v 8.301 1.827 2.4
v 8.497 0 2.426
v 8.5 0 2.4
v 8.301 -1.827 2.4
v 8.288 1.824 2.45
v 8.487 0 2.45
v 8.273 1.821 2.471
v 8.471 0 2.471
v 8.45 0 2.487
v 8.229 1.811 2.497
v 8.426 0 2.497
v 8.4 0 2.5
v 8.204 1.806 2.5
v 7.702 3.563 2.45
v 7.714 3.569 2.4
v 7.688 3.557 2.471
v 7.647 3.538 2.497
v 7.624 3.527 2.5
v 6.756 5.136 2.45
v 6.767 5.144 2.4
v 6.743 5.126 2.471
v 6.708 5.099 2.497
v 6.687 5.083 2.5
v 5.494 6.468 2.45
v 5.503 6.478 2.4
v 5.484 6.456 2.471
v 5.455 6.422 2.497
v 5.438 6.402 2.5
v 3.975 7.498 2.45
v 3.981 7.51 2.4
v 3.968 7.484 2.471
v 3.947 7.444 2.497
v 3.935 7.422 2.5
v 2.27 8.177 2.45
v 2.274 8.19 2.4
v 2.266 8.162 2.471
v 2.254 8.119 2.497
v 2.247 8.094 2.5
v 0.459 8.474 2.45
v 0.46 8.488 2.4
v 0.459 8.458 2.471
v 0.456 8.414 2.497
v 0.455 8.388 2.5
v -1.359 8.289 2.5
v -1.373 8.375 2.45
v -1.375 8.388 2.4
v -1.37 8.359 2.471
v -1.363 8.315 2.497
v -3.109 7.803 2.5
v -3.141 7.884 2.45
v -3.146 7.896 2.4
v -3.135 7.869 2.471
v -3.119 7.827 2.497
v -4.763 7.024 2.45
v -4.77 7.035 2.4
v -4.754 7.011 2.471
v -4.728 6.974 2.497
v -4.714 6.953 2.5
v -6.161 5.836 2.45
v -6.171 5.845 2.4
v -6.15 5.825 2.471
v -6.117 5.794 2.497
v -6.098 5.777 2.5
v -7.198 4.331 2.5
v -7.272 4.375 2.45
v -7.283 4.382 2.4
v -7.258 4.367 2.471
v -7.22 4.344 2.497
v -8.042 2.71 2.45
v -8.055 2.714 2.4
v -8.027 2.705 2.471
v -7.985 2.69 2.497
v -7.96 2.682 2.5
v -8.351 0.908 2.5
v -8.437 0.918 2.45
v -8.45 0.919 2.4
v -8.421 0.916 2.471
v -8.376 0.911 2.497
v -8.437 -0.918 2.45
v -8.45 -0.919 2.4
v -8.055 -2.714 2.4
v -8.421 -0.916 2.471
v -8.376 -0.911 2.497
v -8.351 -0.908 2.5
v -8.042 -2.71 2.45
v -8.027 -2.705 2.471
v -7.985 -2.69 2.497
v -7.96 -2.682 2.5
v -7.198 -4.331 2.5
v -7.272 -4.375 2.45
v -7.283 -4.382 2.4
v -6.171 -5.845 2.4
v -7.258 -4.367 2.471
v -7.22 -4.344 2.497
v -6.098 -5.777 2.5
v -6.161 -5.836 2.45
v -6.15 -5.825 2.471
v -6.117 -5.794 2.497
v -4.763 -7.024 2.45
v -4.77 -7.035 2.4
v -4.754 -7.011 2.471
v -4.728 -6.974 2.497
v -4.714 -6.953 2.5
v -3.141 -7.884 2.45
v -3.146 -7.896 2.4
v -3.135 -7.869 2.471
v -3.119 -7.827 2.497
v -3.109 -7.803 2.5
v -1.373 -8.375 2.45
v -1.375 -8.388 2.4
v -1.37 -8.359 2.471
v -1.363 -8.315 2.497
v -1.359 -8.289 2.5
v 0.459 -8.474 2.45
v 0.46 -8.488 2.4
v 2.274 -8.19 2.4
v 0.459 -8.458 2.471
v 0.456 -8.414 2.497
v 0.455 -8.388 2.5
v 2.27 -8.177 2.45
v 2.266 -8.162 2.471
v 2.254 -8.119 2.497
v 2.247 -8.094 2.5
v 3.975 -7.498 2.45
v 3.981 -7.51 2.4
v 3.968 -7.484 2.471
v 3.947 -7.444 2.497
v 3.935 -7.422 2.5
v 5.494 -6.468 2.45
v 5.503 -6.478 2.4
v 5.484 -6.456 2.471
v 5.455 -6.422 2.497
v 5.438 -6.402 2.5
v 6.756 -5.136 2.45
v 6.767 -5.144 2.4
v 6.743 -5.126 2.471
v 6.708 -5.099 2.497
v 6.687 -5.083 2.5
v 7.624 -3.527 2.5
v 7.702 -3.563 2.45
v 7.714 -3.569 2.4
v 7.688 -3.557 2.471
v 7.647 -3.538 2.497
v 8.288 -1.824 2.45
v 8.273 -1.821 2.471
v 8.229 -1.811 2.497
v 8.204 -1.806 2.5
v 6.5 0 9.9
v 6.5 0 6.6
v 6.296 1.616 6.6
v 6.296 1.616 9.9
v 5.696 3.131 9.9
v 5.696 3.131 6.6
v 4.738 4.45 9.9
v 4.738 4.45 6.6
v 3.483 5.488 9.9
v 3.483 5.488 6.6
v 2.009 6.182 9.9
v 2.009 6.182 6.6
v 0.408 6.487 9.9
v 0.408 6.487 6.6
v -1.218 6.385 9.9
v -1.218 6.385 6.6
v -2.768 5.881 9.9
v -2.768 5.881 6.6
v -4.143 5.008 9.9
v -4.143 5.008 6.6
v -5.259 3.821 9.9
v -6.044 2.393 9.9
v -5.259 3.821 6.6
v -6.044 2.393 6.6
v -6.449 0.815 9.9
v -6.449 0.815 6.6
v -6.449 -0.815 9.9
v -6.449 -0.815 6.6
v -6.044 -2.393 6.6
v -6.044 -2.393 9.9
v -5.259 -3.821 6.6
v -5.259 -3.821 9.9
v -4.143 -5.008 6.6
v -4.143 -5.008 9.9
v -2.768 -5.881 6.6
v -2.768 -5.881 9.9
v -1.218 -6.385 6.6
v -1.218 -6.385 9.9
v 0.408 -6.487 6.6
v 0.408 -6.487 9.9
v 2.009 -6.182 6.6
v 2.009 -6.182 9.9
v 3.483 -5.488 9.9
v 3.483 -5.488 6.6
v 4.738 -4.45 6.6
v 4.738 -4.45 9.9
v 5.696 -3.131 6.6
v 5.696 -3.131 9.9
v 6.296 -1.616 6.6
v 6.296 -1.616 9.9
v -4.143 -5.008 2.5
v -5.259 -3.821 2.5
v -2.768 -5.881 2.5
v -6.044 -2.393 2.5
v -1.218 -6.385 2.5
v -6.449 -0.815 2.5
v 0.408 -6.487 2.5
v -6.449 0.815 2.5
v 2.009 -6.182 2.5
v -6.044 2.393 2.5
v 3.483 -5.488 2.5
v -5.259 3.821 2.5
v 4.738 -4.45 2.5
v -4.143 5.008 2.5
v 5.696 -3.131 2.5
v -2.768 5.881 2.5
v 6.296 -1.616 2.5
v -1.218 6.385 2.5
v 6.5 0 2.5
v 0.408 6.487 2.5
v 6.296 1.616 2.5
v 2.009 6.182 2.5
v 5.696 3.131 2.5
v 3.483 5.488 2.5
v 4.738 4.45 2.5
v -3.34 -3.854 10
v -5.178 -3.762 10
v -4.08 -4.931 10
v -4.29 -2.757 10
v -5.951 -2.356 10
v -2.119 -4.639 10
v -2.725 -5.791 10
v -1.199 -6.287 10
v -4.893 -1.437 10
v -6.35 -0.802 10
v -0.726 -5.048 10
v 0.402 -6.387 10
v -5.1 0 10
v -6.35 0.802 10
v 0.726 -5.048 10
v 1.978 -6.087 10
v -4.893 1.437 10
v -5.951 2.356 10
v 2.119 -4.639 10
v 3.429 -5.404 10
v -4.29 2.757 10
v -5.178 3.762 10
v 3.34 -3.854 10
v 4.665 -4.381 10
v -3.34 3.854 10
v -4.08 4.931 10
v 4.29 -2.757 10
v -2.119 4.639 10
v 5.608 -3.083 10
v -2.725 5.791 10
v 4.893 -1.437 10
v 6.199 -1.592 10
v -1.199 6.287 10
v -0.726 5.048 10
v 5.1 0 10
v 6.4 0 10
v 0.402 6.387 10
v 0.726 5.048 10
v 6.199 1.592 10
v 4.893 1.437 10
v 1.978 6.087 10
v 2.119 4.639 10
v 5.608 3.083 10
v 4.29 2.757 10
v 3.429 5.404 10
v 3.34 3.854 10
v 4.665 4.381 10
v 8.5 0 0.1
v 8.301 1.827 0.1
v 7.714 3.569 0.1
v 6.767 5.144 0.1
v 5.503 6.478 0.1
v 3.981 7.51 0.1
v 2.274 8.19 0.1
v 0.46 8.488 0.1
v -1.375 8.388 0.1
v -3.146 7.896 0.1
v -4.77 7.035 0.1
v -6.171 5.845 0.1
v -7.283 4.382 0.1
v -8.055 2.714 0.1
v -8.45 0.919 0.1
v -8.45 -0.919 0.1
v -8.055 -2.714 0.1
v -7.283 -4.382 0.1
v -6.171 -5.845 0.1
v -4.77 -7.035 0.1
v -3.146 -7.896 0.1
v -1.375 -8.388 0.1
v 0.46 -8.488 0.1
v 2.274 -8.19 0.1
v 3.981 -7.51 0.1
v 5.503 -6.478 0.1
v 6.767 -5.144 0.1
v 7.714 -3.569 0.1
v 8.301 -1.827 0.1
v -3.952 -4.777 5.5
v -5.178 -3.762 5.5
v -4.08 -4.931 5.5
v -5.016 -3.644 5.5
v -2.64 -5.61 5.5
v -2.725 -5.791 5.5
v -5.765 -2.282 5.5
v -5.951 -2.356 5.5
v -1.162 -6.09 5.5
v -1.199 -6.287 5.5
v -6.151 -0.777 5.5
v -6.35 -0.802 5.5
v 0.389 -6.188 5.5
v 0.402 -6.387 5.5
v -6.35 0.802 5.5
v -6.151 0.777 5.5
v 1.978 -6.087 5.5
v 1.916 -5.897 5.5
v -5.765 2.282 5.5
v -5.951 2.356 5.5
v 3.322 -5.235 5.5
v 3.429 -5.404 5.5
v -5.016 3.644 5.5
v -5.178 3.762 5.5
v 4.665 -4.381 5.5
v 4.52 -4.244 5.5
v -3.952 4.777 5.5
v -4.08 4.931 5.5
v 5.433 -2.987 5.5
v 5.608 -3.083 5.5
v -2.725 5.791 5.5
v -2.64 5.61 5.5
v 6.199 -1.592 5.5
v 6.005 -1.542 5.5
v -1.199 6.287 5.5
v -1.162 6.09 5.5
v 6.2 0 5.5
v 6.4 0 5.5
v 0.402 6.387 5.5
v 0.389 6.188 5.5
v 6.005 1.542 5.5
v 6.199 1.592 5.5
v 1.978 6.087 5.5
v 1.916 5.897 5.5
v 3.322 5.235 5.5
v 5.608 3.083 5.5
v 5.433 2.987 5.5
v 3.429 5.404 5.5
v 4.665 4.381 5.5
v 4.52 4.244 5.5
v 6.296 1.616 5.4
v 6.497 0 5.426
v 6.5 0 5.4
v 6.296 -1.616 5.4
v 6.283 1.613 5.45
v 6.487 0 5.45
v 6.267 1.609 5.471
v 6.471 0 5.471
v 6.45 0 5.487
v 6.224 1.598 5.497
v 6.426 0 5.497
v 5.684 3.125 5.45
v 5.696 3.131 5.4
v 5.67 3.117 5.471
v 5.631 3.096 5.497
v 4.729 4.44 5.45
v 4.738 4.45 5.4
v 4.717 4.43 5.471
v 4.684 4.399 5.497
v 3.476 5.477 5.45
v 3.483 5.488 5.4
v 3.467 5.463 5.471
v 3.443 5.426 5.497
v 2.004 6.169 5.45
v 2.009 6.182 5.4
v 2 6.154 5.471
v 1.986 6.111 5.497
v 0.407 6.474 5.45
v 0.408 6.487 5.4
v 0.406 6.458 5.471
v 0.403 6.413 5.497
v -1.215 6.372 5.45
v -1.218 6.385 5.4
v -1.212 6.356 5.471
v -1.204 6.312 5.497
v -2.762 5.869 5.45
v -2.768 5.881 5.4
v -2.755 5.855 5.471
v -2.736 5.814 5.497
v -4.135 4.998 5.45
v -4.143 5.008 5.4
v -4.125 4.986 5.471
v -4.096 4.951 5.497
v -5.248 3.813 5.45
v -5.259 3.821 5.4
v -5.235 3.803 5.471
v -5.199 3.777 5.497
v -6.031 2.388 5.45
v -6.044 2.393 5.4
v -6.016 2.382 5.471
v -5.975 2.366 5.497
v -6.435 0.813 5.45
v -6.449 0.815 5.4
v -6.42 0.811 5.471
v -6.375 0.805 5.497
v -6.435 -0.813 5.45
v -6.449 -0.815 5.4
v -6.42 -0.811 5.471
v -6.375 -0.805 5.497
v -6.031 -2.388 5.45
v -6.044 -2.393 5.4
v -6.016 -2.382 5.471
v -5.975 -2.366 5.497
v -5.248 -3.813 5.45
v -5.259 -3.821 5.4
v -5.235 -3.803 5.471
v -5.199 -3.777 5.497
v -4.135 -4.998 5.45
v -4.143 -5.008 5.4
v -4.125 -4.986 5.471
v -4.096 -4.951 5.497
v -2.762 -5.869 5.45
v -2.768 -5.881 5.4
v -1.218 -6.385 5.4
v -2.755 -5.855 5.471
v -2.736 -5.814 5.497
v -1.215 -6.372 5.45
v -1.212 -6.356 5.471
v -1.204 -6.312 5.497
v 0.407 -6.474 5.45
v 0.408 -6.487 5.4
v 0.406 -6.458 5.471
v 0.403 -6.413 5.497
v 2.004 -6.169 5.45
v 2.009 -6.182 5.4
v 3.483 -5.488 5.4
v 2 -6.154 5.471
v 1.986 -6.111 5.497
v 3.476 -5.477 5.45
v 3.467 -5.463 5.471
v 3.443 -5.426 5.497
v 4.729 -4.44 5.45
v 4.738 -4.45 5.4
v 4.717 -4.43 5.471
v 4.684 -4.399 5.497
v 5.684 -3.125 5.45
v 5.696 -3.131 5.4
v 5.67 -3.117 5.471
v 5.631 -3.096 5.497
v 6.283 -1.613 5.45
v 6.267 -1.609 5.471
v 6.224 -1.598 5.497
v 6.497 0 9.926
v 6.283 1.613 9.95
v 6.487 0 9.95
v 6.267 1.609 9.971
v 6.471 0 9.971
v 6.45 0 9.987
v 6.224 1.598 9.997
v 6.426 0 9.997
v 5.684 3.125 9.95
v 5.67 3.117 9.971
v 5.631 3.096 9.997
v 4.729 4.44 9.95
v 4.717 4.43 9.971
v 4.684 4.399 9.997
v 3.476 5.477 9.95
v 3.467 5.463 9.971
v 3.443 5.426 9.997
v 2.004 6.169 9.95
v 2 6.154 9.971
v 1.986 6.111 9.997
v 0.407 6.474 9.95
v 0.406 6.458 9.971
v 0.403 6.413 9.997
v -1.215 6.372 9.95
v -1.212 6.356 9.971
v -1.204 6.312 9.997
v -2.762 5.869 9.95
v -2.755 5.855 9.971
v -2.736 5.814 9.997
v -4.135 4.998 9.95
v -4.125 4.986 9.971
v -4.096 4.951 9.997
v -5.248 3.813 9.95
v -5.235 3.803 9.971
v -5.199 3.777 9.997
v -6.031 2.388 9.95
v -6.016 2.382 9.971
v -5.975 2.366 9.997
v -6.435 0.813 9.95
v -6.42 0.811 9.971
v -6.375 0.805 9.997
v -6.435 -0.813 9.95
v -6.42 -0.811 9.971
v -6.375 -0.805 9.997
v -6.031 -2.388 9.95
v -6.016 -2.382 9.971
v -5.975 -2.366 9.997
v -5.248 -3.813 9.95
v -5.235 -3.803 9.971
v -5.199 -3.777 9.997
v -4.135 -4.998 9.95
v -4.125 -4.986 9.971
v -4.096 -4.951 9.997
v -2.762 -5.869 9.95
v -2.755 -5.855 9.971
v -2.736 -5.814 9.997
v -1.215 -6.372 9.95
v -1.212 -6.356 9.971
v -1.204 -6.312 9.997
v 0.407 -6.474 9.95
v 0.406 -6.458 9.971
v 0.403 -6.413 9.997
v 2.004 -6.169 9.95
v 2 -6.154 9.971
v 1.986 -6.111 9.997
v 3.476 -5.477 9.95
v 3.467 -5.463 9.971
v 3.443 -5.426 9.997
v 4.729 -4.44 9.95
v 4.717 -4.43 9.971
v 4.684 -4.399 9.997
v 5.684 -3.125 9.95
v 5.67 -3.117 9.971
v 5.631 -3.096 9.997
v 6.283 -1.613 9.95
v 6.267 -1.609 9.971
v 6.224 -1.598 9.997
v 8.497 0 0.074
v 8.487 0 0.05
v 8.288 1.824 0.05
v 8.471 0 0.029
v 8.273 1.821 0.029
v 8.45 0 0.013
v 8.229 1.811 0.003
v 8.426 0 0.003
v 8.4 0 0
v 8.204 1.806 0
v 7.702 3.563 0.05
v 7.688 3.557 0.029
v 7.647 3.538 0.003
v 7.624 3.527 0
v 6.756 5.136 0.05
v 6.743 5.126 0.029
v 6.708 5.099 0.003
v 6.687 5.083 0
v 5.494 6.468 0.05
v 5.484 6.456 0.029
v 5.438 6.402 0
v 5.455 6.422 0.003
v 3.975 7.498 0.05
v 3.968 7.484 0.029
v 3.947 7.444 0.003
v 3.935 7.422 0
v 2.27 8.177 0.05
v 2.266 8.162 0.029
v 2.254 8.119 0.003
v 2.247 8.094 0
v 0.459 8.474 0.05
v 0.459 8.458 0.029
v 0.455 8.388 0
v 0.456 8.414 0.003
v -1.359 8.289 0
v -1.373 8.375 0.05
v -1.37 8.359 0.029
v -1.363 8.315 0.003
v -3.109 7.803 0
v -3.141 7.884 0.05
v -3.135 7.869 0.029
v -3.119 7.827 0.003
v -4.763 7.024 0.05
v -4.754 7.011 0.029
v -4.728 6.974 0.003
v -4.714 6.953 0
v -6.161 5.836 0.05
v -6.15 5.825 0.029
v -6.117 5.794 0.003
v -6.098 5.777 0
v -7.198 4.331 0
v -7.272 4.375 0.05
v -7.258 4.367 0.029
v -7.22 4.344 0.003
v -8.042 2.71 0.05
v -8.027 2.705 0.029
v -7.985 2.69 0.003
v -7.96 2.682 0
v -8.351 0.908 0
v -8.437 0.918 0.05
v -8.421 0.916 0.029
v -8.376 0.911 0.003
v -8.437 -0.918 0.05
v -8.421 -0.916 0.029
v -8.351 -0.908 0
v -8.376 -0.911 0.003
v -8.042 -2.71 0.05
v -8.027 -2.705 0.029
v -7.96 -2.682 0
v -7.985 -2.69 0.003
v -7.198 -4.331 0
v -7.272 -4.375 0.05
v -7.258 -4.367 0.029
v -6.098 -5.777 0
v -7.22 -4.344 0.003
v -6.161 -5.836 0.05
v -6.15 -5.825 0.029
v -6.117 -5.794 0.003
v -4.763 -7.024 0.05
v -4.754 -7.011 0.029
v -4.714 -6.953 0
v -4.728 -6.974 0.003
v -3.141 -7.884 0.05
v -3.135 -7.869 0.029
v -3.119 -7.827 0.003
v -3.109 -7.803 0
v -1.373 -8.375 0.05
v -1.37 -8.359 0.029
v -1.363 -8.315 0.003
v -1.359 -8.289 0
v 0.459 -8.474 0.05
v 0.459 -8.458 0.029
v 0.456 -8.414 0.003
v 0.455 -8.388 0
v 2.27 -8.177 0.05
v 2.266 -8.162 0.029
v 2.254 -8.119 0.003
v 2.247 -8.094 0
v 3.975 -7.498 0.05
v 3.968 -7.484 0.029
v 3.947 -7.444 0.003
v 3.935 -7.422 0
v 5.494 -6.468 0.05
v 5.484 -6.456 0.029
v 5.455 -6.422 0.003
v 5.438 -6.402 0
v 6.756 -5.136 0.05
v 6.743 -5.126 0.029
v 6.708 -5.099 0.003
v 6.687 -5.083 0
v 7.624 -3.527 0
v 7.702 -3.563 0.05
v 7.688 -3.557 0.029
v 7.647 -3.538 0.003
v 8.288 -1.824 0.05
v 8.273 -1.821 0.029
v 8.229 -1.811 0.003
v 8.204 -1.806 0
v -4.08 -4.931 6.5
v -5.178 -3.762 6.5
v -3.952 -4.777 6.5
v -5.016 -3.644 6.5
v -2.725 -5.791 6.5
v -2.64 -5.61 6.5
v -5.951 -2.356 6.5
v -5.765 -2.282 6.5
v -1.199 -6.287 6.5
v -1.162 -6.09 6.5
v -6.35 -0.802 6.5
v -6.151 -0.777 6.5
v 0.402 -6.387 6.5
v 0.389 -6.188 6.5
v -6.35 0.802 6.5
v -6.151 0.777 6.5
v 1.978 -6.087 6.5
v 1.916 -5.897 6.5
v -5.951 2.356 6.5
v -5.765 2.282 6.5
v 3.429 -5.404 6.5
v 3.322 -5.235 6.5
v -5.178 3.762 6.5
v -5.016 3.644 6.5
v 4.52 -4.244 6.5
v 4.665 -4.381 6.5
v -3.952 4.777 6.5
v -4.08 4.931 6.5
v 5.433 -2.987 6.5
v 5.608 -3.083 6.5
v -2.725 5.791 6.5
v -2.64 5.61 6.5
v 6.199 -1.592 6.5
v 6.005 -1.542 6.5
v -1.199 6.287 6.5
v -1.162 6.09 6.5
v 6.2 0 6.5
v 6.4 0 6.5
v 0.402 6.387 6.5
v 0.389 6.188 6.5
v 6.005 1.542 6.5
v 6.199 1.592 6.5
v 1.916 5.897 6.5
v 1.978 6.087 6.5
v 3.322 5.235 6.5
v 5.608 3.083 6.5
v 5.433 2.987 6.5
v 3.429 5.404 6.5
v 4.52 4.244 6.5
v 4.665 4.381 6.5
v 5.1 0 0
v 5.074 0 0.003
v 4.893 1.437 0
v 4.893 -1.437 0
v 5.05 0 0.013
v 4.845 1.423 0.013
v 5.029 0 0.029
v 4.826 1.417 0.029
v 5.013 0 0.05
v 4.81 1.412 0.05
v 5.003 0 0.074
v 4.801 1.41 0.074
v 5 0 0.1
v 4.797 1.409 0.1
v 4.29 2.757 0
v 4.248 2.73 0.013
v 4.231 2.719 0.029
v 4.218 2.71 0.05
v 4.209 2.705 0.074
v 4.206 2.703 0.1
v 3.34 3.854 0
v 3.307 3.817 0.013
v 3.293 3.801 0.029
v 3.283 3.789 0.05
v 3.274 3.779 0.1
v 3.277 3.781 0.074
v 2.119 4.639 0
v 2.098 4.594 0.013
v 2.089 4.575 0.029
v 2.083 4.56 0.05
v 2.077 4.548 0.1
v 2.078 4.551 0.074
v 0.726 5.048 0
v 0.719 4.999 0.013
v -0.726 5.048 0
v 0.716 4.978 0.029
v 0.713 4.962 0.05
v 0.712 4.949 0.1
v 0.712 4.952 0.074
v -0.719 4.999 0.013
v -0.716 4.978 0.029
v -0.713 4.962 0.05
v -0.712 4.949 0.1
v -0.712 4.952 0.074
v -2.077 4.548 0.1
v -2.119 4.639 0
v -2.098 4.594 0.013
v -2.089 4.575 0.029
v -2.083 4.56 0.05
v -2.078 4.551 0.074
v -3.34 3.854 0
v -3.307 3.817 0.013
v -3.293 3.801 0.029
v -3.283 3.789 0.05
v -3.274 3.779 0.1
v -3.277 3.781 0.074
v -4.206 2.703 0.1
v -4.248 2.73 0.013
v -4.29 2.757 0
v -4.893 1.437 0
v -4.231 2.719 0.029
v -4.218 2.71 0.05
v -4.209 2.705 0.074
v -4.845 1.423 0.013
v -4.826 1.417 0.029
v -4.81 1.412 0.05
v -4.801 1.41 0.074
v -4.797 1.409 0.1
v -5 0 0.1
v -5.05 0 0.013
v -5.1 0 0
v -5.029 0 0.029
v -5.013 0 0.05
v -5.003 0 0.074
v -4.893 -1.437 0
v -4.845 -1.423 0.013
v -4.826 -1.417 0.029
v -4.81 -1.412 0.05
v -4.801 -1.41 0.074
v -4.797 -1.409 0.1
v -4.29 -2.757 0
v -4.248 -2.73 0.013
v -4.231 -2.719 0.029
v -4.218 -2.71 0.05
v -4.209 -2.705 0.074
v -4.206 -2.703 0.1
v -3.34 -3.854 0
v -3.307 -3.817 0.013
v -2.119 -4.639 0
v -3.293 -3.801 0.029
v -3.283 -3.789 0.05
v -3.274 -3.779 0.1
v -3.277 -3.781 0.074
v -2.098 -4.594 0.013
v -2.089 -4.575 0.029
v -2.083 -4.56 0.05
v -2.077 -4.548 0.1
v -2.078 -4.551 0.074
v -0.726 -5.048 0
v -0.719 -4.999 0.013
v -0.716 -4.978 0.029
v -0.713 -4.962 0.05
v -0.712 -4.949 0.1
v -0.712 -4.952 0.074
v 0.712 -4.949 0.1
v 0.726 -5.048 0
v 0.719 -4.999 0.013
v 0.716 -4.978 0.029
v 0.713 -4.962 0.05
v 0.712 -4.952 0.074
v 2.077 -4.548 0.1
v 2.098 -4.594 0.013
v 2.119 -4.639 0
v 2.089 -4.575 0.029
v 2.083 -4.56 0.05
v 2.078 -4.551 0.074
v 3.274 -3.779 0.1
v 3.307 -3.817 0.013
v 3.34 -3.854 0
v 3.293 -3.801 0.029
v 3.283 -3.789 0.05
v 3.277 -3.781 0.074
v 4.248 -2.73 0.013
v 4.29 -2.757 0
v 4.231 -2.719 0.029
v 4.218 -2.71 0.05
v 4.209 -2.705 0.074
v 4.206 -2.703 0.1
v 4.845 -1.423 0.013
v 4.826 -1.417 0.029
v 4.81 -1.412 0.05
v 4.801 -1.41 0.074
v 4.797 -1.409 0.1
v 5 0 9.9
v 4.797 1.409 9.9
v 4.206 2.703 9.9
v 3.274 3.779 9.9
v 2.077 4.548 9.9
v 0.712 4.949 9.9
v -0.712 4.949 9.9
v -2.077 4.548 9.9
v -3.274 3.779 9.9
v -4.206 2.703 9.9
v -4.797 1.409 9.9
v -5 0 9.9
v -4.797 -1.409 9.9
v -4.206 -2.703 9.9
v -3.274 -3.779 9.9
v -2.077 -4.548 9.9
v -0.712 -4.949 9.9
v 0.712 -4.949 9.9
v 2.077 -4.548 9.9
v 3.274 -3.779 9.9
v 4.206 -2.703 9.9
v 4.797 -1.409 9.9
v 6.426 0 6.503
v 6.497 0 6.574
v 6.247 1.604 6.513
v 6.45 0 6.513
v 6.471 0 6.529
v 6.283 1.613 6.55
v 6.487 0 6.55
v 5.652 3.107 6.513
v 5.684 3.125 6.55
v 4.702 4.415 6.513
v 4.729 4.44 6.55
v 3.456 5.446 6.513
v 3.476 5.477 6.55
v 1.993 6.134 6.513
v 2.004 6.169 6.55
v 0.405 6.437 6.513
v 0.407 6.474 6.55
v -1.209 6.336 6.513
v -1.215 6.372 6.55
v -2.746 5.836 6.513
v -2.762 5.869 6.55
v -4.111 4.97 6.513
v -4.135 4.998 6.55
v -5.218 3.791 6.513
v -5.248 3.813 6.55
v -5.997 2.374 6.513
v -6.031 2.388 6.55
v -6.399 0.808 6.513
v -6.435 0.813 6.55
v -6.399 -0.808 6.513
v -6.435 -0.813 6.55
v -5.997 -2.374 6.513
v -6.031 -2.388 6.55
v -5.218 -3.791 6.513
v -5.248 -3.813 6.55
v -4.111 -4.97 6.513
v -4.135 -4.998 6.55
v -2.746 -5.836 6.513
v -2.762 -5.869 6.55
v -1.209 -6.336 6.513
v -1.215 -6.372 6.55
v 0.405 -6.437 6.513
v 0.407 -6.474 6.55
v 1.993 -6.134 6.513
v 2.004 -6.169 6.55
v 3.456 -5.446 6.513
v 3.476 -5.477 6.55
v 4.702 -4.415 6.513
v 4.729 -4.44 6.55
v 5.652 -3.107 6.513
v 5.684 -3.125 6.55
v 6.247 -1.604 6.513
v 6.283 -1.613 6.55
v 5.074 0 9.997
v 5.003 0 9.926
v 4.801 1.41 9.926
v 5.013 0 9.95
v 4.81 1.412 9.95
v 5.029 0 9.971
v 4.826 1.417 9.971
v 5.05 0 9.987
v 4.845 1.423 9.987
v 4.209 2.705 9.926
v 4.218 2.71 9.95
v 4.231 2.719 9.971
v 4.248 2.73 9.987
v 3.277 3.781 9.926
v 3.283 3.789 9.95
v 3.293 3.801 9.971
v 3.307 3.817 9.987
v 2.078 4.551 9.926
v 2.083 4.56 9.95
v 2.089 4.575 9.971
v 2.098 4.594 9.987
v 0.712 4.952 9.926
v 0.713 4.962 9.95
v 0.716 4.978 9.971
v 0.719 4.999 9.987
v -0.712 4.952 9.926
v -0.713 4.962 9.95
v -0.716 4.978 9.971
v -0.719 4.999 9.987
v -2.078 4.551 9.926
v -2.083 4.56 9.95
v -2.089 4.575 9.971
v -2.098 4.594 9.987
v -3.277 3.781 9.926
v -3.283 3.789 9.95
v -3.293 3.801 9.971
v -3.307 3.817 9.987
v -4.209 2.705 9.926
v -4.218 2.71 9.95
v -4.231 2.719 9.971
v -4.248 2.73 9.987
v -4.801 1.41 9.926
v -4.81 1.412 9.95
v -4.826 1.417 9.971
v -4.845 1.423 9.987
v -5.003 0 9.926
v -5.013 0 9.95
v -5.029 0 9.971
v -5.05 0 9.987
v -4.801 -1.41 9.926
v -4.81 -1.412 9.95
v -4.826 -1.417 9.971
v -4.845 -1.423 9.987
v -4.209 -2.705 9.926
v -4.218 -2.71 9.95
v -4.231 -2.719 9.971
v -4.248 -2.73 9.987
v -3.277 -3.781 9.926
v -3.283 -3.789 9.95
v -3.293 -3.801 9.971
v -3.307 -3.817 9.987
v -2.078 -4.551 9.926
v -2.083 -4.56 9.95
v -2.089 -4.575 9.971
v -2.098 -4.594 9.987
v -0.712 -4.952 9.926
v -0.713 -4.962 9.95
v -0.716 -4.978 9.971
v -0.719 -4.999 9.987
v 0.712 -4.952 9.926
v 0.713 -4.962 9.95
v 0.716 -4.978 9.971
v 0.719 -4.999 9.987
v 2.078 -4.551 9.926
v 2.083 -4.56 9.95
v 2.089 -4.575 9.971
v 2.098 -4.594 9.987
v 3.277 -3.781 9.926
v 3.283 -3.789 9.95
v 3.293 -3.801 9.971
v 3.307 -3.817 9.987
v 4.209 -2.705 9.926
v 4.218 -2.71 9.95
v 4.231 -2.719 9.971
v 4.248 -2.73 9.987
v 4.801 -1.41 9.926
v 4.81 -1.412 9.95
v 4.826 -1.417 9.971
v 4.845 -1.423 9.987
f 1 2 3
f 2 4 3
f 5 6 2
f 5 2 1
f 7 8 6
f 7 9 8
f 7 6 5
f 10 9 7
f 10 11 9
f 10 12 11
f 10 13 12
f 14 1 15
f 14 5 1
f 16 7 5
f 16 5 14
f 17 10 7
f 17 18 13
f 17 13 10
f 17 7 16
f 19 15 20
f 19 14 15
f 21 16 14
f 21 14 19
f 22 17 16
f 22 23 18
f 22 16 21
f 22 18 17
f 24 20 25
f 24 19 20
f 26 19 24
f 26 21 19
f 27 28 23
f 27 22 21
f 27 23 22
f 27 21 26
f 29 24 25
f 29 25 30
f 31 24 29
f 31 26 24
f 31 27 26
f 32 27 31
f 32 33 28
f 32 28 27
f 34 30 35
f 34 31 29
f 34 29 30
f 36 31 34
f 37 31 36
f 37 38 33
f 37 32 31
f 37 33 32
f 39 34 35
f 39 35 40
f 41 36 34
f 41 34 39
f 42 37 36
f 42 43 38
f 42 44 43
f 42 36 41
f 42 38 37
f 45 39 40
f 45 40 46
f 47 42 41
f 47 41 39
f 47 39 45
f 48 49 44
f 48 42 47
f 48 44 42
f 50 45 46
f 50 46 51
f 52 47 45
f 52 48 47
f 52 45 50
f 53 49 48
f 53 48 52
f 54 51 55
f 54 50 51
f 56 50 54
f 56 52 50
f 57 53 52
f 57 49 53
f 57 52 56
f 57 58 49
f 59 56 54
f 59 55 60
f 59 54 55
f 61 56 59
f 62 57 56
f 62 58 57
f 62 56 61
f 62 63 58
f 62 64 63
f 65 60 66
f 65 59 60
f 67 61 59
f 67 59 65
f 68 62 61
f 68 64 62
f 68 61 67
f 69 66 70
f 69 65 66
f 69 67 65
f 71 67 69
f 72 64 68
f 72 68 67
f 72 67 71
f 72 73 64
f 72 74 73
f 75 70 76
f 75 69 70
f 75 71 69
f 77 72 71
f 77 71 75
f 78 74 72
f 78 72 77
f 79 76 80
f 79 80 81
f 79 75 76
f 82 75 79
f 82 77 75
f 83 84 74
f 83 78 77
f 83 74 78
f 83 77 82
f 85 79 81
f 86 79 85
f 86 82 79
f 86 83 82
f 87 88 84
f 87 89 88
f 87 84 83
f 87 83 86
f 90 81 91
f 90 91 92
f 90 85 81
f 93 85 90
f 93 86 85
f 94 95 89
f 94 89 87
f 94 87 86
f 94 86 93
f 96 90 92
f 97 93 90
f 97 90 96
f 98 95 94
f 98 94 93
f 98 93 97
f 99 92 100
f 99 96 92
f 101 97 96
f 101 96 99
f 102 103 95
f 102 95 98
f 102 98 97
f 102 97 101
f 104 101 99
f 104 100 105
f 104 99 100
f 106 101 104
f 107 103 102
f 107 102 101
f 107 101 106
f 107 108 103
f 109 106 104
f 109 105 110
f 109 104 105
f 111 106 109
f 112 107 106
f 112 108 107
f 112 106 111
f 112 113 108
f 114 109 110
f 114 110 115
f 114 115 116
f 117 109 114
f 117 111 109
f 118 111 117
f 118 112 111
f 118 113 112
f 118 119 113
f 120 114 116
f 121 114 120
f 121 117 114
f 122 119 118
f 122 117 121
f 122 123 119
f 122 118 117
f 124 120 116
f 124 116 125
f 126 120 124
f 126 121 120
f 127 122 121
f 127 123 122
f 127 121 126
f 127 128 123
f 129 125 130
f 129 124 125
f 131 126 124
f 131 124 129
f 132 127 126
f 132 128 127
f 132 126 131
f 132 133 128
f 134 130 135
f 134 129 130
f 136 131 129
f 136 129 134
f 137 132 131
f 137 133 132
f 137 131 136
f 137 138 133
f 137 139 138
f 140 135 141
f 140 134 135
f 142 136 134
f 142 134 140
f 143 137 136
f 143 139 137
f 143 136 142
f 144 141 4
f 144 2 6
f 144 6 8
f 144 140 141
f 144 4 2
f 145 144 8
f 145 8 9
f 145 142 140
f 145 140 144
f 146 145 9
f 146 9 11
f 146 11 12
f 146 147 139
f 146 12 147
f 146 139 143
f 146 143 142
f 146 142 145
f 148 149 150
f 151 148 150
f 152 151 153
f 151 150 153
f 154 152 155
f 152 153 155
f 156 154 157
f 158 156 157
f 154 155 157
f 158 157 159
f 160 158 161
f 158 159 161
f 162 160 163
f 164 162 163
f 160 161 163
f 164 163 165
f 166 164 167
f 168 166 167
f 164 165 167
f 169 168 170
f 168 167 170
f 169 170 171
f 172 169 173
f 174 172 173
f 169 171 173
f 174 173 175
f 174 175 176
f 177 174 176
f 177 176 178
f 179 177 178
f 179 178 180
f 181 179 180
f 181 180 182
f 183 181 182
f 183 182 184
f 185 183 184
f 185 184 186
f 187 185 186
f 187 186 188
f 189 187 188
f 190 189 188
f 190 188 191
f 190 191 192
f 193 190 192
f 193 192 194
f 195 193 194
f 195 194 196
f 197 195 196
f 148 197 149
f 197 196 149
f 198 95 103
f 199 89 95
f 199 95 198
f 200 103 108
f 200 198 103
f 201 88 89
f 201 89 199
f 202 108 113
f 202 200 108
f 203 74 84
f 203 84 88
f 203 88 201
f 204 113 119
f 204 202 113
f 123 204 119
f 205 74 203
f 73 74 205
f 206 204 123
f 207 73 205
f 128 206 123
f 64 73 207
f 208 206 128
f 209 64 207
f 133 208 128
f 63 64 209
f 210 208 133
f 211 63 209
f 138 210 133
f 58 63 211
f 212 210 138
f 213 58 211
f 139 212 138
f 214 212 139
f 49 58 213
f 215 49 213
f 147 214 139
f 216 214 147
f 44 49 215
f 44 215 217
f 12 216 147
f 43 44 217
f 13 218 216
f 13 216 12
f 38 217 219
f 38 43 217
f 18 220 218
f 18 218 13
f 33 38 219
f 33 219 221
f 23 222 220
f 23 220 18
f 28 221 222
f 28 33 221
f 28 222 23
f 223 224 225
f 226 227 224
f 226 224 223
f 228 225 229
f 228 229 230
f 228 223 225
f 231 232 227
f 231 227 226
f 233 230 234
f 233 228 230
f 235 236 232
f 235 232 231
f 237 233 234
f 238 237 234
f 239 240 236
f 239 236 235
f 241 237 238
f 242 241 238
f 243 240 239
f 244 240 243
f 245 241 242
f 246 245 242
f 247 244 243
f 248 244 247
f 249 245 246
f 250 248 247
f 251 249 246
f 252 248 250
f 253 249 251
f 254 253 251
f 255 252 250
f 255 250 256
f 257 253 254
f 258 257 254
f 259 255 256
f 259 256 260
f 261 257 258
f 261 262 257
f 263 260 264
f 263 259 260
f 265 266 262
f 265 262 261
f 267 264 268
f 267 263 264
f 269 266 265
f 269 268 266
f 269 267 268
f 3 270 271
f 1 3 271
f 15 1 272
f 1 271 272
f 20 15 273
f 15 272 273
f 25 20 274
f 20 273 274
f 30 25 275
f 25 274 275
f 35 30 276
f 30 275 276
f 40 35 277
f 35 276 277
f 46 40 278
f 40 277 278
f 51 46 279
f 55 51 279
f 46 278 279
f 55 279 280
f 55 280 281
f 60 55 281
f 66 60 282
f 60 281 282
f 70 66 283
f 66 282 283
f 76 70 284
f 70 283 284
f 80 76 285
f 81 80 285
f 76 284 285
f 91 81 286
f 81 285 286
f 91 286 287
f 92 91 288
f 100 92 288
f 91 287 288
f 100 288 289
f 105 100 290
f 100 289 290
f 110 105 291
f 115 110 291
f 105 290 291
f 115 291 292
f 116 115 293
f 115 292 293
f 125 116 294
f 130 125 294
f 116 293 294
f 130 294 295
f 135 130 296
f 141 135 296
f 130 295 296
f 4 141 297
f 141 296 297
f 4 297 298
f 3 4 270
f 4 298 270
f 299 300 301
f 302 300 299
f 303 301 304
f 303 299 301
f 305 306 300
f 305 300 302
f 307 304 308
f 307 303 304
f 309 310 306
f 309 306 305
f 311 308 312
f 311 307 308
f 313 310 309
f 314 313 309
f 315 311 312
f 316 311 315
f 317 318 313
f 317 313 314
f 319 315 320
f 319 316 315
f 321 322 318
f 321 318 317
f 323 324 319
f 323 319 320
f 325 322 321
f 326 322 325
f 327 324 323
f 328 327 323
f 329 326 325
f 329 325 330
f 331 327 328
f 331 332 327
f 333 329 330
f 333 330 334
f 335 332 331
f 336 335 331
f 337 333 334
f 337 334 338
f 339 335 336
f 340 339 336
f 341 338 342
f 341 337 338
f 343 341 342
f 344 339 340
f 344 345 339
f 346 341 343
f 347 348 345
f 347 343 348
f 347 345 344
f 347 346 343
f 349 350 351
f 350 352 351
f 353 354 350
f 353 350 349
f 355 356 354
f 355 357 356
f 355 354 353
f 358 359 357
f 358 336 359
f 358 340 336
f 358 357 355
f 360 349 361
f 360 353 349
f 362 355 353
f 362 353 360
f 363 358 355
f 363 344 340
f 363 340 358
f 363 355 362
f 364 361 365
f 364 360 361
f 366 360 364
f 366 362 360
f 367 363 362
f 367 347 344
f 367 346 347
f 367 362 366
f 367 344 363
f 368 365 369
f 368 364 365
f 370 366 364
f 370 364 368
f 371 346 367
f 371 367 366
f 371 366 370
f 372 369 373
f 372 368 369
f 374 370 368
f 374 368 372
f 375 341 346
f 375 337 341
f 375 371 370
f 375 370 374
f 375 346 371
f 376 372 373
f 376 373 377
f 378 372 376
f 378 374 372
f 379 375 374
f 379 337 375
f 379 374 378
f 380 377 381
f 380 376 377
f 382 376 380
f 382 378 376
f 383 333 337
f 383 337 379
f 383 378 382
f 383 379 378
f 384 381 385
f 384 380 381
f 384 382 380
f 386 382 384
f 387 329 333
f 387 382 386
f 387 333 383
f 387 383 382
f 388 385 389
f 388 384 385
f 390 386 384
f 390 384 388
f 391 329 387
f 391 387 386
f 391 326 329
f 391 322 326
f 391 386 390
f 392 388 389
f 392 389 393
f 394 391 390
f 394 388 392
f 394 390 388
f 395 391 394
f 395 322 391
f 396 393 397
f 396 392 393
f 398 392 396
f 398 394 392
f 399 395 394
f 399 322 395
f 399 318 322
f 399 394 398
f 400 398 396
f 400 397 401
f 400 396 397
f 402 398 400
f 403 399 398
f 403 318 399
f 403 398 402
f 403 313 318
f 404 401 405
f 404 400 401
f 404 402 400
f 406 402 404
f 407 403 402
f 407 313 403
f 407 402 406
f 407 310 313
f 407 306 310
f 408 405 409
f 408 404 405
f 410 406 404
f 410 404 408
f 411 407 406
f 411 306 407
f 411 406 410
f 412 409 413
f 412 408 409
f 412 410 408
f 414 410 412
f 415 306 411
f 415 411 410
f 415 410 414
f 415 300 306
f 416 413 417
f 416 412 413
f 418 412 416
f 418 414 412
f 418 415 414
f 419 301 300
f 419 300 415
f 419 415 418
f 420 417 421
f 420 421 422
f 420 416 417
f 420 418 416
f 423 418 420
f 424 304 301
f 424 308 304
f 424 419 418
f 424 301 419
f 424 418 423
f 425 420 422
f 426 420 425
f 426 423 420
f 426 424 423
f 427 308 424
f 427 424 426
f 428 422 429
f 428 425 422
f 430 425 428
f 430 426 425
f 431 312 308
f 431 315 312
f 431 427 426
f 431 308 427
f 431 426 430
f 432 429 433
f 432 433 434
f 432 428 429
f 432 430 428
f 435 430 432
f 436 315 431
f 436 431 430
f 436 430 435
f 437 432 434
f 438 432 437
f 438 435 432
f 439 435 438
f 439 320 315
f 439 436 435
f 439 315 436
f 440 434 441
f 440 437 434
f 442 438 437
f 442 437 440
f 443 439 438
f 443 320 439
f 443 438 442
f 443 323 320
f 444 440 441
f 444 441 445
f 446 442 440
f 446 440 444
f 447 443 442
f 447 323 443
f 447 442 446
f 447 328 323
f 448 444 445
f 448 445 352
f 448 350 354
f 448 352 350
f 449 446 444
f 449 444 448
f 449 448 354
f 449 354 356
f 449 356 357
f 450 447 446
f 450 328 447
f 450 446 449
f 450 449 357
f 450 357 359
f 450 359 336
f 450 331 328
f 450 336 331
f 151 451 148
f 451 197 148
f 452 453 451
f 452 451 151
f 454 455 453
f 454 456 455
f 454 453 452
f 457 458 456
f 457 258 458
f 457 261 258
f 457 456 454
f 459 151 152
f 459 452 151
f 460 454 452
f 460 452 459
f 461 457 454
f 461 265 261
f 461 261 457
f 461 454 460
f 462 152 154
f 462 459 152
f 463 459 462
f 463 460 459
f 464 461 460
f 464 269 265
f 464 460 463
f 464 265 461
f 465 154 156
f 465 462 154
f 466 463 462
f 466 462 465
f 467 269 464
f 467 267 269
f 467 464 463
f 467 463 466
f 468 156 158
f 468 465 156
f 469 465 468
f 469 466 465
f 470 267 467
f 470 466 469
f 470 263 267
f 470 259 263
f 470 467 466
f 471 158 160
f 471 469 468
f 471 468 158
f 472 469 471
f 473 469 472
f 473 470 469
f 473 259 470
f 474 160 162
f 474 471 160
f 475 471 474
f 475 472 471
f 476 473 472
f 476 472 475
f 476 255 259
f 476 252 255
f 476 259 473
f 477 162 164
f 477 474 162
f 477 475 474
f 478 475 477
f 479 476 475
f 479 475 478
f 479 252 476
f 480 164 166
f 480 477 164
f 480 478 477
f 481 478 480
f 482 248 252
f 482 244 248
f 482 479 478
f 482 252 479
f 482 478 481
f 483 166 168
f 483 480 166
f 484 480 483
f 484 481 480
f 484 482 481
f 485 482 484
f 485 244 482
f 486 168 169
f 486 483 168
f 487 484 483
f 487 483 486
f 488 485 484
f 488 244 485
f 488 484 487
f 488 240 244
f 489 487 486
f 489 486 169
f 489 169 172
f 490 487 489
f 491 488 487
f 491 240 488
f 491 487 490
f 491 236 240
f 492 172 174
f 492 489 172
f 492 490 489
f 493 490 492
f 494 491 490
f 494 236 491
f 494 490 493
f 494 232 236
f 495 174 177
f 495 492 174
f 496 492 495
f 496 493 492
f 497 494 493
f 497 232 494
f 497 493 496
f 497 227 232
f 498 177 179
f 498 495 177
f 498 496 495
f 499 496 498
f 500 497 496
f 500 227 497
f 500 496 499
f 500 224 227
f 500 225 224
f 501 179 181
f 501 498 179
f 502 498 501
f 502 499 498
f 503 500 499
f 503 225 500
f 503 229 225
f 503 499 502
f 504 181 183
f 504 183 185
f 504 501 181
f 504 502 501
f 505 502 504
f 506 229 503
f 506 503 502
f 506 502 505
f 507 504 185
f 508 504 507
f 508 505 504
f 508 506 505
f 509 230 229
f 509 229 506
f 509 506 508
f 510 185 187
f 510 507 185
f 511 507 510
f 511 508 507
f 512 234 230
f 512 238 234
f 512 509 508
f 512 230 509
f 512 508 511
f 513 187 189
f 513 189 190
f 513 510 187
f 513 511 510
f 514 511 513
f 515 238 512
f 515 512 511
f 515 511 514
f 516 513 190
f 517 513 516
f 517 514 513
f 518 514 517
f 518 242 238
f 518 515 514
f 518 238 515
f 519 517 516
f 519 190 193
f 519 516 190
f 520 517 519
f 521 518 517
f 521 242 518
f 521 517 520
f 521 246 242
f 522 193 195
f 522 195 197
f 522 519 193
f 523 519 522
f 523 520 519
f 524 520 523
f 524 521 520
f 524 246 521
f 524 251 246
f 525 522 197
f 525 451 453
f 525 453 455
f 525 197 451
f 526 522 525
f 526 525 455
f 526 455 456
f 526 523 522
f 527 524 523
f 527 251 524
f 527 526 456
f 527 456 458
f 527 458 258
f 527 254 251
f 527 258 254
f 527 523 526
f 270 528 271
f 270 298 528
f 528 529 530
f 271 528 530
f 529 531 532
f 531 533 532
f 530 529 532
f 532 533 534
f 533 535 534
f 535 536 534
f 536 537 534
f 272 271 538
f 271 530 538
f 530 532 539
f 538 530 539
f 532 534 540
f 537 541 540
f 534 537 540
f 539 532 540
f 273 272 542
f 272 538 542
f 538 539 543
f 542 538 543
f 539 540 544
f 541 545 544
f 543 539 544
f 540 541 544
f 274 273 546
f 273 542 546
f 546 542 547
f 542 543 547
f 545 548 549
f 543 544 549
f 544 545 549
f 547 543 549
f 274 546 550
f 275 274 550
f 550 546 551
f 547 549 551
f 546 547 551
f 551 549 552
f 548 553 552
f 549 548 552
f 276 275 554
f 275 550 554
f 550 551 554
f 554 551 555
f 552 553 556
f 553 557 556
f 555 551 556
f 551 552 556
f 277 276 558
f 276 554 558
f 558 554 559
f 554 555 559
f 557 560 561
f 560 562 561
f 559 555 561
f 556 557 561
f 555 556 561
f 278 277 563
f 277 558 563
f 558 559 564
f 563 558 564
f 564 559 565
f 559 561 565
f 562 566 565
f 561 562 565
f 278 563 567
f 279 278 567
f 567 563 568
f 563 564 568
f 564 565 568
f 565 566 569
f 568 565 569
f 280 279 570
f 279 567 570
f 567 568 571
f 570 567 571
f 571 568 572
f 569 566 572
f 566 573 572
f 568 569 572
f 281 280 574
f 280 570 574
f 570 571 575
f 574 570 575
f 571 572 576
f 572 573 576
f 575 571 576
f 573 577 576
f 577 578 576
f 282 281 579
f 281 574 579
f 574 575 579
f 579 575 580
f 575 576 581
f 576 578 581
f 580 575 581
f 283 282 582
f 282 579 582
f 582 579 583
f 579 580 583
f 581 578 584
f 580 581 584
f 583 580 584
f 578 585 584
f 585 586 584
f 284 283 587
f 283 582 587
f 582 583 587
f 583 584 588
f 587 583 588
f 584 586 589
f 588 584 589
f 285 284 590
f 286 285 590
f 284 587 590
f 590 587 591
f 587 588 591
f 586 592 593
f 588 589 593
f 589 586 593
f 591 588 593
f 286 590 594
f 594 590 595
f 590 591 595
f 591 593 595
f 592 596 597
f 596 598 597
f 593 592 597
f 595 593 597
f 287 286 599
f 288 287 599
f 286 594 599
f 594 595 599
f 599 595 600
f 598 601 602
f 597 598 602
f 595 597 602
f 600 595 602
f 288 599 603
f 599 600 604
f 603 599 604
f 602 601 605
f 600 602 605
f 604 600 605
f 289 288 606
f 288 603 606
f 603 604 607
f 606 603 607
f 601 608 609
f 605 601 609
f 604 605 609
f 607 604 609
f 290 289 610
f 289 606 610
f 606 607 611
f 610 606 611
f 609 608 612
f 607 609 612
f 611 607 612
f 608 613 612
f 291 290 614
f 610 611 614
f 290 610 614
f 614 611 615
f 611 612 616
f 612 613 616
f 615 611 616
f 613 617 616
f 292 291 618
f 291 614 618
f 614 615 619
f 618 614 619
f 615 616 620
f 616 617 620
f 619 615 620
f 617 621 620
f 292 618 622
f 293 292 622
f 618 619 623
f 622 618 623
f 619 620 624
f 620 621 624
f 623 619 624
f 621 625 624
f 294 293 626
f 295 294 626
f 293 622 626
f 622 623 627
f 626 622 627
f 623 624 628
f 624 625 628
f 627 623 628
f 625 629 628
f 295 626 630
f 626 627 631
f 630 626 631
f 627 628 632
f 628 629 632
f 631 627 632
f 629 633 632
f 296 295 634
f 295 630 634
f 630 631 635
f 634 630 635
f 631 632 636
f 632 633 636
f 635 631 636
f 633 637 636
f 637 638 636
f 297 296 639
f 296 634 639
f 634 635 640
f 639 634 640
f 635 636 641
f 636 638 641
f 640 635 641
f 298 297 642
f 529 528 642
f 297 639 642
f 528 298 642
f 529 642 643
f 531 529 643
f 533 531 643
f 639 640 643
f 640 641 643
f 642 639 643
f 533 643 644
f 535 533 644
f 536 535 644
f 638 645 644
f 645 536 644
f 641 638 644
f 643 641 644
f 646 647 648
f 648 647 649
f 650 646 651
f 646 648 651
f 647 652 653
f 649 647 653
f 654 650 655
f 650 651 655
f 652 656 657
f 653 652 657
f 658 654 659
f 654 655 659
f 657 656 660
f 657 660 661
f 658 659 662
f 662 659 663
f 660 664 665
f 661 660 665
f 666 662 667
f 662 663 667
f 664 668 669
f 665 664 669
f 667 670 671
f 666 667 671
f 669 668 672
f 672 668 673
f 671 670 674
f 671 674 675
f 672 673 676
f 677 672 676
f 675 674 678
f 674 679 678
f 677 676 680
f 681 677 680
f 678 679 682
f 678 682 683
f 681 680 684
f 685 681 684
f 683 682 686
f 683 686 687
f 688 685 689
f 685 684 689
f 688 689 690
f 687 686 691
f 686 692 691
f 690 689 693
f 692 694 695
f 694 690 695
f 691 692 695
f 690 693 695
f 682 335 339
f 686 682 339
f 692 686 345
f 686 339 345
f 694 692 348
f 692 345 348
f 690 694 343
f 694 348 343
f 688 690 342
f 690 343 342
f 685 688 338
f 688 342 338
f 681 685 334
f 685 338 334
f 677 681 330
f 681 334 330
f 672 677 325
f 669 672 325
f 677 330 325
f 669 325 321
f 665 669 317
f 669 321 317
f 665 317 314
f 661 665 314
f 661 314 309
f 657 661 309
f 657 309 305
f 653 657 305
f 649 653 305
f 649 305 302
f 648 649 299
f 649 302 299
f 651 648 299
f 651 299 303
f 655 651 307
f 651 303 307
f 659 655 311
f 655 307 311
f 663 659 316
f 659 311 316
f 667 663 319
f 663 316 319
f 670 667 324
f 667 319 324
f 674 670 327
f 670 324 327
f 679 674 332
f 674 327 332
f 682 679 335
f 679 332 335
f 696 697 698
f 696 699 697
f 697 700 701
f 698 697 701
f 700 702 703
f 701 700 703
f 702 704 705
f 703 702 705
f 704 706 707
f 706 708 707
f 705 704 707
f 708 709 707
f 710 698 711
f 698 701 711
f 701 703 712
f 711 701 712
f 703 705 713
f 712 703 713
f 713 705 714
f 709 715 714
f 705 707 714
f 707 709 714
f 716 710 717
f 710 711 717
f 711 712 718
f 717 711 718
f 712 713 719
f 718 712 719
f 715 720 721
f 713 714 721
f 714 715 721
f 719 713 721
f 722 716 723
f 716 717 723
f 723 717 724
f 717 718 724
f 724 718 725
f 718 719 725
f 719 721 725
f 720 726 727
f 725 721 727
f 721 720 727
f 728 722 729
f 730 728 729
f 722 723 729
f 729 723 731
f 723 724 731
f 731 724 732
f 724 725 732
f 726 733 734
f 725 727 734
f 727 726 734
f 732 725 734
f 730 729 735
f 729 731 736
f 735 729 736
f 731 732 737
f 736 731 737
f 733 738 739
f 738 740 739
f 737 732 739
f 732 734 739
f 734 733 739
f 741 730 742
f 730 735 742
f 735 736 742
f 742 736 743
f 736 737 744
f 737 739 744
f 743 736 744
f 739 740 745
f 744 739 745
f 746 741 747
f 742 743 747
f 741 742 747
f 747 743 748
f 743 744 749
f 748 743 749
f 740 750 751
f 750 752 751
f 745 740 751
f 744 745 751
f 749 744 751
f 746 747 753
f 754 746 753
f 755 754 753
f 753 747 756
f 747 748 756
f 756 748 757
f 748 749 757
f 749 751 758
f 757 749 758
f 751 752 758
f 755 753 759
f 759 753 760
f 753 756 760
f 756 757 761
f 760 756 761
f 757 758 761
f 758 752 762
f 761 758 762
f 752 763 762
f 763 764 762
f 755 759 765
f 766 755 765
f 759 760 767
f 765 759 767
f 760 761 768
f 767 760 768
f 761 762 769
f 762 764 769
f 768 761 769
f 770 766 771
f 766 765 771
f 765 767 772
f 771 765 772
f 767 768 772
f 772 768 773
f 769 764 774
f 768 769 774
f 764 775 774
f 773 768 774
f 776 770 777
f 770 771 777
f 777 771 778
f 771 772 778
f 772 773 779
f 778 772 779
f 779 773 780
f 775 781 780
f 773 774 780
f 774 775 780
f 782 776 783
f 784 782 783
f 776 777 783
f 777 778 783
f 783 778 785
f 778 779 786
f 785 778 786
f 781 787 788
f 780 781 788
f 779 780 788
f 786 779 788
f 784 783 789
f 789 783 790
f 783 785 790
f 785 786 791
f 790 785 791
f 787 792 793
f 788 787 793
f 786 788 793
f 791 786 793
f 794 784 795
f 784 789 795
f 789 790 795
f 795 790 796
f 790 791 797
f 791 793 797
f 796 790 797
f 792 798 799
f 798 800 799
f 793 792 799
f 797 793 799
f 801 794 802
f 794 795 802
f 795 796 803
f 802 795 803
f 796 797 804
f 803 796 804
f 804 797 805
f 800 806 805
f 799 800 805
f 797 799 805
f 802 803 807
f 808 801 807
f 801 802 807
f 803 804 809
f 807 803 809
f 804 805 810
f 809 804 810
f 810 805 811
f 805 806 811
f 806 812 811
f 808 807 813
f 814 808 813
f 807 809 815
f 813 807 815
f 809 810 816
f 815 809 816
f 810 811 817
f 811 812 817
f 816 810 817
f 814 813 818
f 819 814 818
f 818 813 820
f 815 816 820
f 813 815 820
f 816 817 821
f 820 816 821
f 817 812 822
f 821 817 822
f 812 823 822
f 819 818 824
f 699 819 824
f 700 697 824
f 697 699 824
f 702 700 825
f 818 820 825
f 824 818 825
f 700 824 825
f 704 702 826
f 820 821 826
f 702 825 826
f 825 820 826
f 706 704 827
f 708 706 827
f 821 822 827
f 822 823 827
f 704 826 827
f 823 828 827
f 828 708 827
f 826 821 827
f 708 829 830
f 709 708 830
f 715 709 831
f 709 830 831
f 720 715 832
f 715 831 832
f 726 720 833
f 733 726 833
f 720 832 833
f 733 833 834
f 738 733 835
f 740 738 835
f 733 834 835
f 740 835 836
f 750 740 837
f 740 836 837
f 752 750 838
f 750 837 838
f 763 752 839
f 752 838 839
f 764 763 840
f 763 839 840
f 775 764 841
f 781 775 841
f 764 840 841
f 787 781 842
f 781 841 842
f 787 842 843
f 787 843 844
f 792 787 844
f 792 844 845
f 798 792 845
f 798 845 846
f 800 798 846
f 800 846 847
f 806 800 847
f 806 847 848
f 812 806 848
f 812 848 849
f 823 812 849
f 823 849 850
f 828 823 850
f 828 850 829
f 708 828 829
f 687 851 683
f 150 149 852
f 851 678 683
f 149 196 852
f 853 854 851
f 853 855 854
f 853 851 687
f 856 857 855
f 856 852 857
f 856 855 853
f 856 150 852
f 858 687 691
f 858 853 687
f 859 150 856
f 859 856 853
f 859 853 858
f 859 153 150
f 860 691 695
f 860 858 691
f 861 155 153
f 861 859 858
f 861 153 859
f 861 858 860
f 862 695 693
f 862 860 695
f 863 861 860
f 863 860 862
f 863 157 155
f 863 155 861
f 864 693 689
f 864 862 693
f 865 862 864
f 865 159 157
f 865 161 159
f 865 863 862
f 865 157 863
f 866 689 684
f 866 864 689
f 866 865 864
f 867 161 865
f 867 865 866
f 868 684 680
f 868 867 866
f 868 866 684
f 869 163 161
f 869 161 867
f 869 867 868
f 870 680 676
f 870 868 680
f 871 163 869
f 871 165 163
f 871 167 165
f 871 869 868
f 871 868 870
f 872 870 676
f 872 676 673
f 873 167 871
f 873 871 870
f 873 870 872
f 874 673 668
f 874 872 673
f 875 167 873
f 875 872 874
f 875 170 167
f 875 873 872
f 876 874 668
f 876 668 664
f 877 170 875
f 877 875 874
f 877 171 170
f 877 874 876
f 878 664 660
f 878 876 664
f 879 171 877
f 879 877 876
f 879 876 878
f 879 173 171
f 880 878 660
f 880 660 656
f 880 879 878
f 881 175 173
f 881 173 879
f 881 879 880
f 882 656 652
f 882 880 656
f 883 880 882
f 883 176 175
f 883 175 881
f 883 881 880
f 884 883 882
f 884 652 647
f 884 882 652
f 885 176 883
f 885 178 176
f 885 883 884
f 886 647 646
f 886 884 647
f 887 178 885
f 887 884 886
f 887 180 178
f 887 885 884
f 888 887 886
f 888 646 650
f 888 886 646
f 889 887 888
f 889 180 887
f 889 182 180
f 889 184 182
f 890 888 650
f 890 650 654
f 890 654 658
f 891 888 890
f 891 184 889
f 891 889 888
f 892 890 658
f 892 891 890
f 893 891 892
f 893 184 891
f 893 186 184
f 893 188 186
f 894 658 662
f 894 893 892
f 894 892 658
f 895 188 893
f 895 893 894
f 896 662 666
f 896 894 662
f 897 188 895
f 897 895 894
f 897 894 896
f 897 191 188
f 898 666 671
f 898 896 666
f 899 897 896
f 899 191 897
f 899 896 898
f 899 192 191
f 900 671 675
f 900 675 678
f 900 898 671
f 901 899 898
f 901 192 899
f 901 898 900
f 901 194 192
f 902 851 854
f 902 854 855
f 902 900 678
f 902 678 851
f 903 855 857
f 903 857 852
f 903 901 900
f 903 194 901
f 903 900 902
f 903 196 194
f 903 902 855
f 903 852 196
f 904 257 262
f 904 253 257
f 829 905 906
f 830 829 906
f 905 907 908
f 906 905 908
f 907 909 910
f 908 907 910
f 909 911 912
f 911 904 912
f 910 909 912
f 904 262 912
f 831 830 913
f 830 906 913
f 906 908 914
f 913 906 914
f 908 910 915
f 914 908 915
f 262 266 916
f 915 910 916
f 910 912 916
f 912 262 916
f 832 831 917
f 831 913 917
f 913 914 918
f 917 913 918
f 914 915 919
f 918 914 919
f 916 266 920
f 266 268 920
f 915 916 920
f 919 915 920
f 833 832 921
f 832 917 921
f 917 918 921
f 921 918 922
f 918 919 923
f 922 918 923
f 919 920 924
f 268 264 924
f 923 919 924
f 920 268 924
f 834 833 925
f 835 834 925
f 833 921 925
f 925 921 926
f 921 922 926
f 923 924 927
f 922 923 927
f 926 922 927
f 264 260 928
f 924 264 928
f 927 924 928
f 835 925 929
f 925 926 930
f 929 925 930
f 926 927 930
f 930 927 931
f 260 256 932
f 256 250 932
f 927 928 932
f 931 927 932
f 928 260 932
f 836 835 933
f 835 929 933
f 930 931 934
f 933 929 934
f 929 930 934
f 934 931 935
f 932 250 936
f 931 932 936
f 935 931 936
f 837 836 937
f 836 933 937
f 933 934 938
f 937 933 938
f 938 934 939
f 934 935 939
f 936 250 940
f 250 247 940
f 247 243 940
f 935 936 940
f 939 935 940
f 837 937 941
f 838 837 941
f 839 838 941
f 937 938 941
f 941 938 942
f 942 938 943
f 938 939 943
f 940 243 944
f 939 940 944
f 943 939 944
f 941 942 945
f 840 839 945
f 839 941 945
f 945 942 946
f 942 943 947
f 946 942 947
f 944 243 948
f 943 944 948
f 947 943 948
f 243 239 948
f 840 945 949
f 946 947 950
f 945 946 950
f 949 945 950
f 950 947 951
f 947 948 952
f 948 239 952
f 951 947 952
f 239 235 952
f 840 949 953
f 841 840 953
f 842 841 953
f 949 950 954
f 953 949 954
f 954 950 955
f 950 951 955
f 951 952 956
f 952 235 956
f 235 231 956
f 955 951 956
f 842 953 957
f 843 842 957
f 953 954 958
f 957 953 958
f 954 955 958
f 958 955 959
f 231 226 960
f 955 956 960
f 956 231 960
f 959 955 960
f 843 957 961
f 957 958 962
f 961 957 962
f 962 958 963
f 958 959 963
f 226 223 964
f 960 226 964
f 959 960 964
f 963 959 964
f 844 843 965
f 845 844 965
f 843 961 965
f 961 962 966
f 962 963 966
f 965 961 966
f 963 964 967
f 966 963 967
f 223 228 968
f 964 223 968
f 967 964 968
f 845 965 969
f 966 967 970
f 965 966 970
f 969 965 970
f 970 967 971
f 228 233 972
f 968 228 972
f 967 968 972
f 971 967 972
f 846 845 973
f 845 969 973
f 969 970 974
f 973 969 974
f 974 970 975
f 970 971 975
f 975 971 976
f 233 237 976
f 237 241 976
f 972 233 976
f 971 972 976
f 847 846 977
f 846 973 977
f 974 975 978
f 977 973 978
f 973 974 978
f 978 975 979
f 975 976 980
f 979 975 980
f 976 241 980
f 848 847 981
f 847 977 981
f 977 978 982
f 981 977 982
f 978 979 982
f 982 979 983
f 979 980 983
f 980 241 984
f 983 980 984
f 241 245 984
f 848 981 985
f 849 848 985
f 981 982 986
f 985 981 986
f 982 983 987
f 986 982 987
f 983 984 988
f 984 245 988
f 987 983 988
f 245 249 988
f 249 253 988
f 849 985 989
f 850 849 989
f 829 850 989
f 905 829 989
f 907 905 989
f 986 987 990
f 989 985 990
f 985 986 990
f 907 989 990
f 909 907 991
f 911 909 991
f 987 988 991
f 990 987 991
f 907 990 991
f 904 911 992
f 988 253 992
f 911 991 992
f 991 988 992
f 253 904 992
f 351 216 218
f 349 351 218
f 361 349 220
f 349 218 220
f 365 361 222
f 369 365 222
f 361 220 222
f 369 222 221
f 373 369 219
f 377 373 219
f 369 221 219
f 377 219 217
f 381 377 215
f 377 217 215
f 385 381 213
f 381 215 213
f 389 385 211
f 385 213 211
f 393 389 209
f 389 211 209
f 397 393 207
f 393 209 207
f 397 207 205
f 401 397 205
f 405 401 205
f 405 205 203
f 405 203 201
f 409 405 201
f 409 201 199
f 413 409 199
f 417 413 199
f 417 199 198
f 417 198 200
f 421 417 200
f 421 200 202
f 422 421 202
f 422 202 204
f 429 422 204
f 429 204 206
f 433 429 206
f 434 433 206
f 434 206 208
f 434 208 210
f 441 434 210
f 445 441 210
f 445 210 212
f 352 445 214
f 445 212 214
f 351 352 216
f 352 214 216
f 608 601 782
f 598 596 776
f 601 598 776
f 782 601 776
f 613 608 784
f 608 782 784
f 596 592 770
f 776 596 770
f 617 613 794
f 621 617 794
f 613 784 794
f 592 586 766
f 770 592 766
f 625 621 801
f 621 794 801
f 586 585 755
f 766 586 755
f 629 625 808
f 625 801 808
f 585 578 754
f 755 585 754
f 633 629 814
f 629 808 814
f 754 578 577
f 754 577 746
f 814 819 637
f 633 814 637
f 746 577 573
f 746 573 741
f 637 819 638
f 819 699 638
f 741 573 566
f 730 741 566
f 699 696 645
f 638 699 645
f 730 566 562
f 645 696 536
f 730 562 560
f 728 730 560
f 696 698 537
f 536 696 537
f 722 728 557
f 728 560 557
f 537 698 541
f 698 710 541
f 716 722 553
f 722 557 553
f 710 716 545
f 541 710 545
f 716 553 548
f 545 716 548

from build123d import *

# Parameters (mm, degrees)
SKETCH1_R          = 8.5
EXTRUDE1_DEPTH     = 2.5
SKETCH2_R          = 6.5
EXTRUDE2_DEPTH     = 7.5
SKETCH3_R          = 5
CUT_EXTRUDE1_DEPTH = 16.636495771
FILLET1_R          = 0.1
CUT_EXTRUDE2_START = -4.5
SKETCH4_R          = 6.5
SKETCH4_R_2        = 6.2
CUT_EXTRUDE2_DEPTH = 1
FILLET2_R          = 0.1


with BuildPart() as part:
    # Sketch1 → Extrude1 (new body)
    with BuildSketch(Plane.XY):
        Circle(SKETCH1_R)
    extrude(amount=EXTRUDE1_DEPTH)

    # Sketch2 → Extrude2 (add)
    with BuildSketch(Plane.XY.offset(2.5)):
        Circle(SKETCH2_R)
    extrude(amount=EXTRUDE2_DEPTH)

    # Sketch3 → Cut-Extrude1 (cut, through all)
    with BuildSketch(Plane.XY.offset(10)):
        Circle(SKETCH3_R)
    extrude(amount=-CUT_EXTRUDE1_DEPTH, mode=Mode.SUBTRACT)

    # Fillet1
    fillet1_edges = [part.edges().sort_by_distance(p)[0] for p in [
        (-5, 0, 0),
        (-5, 0, 10),
        (-8.5, 0, 0),
        (-8.5, 0, 2.5),
        (-6.5, 0, 10),
    ]]
    fillet(fillet1_edges, radius=FILLET1_R)

    # Sketch4 → Cut-Extrude2 (cut)
    with BuildSketch(Plane.XY.offset(10).offset(CUT_EXTRUDE2_START)):
        Circle(SKETCH4_R)
        Circle(SKETCH4_R_2, mode=Mode.SUBTRACT)
    extrude(amount=CUT_EXTRUDE2_DEPTH, mode=Mode.SUBTRACT)

    # Fillet2
    fillet2_edges = [part.edges().sort_by_distance(p)[0] for p in [
        (-6.5, 0, 5.5),
        (-6.5, 0, 6.5),
    ]]
    fillet(fillet2_edges, radius=FILLET2_R)


solid = part.part
